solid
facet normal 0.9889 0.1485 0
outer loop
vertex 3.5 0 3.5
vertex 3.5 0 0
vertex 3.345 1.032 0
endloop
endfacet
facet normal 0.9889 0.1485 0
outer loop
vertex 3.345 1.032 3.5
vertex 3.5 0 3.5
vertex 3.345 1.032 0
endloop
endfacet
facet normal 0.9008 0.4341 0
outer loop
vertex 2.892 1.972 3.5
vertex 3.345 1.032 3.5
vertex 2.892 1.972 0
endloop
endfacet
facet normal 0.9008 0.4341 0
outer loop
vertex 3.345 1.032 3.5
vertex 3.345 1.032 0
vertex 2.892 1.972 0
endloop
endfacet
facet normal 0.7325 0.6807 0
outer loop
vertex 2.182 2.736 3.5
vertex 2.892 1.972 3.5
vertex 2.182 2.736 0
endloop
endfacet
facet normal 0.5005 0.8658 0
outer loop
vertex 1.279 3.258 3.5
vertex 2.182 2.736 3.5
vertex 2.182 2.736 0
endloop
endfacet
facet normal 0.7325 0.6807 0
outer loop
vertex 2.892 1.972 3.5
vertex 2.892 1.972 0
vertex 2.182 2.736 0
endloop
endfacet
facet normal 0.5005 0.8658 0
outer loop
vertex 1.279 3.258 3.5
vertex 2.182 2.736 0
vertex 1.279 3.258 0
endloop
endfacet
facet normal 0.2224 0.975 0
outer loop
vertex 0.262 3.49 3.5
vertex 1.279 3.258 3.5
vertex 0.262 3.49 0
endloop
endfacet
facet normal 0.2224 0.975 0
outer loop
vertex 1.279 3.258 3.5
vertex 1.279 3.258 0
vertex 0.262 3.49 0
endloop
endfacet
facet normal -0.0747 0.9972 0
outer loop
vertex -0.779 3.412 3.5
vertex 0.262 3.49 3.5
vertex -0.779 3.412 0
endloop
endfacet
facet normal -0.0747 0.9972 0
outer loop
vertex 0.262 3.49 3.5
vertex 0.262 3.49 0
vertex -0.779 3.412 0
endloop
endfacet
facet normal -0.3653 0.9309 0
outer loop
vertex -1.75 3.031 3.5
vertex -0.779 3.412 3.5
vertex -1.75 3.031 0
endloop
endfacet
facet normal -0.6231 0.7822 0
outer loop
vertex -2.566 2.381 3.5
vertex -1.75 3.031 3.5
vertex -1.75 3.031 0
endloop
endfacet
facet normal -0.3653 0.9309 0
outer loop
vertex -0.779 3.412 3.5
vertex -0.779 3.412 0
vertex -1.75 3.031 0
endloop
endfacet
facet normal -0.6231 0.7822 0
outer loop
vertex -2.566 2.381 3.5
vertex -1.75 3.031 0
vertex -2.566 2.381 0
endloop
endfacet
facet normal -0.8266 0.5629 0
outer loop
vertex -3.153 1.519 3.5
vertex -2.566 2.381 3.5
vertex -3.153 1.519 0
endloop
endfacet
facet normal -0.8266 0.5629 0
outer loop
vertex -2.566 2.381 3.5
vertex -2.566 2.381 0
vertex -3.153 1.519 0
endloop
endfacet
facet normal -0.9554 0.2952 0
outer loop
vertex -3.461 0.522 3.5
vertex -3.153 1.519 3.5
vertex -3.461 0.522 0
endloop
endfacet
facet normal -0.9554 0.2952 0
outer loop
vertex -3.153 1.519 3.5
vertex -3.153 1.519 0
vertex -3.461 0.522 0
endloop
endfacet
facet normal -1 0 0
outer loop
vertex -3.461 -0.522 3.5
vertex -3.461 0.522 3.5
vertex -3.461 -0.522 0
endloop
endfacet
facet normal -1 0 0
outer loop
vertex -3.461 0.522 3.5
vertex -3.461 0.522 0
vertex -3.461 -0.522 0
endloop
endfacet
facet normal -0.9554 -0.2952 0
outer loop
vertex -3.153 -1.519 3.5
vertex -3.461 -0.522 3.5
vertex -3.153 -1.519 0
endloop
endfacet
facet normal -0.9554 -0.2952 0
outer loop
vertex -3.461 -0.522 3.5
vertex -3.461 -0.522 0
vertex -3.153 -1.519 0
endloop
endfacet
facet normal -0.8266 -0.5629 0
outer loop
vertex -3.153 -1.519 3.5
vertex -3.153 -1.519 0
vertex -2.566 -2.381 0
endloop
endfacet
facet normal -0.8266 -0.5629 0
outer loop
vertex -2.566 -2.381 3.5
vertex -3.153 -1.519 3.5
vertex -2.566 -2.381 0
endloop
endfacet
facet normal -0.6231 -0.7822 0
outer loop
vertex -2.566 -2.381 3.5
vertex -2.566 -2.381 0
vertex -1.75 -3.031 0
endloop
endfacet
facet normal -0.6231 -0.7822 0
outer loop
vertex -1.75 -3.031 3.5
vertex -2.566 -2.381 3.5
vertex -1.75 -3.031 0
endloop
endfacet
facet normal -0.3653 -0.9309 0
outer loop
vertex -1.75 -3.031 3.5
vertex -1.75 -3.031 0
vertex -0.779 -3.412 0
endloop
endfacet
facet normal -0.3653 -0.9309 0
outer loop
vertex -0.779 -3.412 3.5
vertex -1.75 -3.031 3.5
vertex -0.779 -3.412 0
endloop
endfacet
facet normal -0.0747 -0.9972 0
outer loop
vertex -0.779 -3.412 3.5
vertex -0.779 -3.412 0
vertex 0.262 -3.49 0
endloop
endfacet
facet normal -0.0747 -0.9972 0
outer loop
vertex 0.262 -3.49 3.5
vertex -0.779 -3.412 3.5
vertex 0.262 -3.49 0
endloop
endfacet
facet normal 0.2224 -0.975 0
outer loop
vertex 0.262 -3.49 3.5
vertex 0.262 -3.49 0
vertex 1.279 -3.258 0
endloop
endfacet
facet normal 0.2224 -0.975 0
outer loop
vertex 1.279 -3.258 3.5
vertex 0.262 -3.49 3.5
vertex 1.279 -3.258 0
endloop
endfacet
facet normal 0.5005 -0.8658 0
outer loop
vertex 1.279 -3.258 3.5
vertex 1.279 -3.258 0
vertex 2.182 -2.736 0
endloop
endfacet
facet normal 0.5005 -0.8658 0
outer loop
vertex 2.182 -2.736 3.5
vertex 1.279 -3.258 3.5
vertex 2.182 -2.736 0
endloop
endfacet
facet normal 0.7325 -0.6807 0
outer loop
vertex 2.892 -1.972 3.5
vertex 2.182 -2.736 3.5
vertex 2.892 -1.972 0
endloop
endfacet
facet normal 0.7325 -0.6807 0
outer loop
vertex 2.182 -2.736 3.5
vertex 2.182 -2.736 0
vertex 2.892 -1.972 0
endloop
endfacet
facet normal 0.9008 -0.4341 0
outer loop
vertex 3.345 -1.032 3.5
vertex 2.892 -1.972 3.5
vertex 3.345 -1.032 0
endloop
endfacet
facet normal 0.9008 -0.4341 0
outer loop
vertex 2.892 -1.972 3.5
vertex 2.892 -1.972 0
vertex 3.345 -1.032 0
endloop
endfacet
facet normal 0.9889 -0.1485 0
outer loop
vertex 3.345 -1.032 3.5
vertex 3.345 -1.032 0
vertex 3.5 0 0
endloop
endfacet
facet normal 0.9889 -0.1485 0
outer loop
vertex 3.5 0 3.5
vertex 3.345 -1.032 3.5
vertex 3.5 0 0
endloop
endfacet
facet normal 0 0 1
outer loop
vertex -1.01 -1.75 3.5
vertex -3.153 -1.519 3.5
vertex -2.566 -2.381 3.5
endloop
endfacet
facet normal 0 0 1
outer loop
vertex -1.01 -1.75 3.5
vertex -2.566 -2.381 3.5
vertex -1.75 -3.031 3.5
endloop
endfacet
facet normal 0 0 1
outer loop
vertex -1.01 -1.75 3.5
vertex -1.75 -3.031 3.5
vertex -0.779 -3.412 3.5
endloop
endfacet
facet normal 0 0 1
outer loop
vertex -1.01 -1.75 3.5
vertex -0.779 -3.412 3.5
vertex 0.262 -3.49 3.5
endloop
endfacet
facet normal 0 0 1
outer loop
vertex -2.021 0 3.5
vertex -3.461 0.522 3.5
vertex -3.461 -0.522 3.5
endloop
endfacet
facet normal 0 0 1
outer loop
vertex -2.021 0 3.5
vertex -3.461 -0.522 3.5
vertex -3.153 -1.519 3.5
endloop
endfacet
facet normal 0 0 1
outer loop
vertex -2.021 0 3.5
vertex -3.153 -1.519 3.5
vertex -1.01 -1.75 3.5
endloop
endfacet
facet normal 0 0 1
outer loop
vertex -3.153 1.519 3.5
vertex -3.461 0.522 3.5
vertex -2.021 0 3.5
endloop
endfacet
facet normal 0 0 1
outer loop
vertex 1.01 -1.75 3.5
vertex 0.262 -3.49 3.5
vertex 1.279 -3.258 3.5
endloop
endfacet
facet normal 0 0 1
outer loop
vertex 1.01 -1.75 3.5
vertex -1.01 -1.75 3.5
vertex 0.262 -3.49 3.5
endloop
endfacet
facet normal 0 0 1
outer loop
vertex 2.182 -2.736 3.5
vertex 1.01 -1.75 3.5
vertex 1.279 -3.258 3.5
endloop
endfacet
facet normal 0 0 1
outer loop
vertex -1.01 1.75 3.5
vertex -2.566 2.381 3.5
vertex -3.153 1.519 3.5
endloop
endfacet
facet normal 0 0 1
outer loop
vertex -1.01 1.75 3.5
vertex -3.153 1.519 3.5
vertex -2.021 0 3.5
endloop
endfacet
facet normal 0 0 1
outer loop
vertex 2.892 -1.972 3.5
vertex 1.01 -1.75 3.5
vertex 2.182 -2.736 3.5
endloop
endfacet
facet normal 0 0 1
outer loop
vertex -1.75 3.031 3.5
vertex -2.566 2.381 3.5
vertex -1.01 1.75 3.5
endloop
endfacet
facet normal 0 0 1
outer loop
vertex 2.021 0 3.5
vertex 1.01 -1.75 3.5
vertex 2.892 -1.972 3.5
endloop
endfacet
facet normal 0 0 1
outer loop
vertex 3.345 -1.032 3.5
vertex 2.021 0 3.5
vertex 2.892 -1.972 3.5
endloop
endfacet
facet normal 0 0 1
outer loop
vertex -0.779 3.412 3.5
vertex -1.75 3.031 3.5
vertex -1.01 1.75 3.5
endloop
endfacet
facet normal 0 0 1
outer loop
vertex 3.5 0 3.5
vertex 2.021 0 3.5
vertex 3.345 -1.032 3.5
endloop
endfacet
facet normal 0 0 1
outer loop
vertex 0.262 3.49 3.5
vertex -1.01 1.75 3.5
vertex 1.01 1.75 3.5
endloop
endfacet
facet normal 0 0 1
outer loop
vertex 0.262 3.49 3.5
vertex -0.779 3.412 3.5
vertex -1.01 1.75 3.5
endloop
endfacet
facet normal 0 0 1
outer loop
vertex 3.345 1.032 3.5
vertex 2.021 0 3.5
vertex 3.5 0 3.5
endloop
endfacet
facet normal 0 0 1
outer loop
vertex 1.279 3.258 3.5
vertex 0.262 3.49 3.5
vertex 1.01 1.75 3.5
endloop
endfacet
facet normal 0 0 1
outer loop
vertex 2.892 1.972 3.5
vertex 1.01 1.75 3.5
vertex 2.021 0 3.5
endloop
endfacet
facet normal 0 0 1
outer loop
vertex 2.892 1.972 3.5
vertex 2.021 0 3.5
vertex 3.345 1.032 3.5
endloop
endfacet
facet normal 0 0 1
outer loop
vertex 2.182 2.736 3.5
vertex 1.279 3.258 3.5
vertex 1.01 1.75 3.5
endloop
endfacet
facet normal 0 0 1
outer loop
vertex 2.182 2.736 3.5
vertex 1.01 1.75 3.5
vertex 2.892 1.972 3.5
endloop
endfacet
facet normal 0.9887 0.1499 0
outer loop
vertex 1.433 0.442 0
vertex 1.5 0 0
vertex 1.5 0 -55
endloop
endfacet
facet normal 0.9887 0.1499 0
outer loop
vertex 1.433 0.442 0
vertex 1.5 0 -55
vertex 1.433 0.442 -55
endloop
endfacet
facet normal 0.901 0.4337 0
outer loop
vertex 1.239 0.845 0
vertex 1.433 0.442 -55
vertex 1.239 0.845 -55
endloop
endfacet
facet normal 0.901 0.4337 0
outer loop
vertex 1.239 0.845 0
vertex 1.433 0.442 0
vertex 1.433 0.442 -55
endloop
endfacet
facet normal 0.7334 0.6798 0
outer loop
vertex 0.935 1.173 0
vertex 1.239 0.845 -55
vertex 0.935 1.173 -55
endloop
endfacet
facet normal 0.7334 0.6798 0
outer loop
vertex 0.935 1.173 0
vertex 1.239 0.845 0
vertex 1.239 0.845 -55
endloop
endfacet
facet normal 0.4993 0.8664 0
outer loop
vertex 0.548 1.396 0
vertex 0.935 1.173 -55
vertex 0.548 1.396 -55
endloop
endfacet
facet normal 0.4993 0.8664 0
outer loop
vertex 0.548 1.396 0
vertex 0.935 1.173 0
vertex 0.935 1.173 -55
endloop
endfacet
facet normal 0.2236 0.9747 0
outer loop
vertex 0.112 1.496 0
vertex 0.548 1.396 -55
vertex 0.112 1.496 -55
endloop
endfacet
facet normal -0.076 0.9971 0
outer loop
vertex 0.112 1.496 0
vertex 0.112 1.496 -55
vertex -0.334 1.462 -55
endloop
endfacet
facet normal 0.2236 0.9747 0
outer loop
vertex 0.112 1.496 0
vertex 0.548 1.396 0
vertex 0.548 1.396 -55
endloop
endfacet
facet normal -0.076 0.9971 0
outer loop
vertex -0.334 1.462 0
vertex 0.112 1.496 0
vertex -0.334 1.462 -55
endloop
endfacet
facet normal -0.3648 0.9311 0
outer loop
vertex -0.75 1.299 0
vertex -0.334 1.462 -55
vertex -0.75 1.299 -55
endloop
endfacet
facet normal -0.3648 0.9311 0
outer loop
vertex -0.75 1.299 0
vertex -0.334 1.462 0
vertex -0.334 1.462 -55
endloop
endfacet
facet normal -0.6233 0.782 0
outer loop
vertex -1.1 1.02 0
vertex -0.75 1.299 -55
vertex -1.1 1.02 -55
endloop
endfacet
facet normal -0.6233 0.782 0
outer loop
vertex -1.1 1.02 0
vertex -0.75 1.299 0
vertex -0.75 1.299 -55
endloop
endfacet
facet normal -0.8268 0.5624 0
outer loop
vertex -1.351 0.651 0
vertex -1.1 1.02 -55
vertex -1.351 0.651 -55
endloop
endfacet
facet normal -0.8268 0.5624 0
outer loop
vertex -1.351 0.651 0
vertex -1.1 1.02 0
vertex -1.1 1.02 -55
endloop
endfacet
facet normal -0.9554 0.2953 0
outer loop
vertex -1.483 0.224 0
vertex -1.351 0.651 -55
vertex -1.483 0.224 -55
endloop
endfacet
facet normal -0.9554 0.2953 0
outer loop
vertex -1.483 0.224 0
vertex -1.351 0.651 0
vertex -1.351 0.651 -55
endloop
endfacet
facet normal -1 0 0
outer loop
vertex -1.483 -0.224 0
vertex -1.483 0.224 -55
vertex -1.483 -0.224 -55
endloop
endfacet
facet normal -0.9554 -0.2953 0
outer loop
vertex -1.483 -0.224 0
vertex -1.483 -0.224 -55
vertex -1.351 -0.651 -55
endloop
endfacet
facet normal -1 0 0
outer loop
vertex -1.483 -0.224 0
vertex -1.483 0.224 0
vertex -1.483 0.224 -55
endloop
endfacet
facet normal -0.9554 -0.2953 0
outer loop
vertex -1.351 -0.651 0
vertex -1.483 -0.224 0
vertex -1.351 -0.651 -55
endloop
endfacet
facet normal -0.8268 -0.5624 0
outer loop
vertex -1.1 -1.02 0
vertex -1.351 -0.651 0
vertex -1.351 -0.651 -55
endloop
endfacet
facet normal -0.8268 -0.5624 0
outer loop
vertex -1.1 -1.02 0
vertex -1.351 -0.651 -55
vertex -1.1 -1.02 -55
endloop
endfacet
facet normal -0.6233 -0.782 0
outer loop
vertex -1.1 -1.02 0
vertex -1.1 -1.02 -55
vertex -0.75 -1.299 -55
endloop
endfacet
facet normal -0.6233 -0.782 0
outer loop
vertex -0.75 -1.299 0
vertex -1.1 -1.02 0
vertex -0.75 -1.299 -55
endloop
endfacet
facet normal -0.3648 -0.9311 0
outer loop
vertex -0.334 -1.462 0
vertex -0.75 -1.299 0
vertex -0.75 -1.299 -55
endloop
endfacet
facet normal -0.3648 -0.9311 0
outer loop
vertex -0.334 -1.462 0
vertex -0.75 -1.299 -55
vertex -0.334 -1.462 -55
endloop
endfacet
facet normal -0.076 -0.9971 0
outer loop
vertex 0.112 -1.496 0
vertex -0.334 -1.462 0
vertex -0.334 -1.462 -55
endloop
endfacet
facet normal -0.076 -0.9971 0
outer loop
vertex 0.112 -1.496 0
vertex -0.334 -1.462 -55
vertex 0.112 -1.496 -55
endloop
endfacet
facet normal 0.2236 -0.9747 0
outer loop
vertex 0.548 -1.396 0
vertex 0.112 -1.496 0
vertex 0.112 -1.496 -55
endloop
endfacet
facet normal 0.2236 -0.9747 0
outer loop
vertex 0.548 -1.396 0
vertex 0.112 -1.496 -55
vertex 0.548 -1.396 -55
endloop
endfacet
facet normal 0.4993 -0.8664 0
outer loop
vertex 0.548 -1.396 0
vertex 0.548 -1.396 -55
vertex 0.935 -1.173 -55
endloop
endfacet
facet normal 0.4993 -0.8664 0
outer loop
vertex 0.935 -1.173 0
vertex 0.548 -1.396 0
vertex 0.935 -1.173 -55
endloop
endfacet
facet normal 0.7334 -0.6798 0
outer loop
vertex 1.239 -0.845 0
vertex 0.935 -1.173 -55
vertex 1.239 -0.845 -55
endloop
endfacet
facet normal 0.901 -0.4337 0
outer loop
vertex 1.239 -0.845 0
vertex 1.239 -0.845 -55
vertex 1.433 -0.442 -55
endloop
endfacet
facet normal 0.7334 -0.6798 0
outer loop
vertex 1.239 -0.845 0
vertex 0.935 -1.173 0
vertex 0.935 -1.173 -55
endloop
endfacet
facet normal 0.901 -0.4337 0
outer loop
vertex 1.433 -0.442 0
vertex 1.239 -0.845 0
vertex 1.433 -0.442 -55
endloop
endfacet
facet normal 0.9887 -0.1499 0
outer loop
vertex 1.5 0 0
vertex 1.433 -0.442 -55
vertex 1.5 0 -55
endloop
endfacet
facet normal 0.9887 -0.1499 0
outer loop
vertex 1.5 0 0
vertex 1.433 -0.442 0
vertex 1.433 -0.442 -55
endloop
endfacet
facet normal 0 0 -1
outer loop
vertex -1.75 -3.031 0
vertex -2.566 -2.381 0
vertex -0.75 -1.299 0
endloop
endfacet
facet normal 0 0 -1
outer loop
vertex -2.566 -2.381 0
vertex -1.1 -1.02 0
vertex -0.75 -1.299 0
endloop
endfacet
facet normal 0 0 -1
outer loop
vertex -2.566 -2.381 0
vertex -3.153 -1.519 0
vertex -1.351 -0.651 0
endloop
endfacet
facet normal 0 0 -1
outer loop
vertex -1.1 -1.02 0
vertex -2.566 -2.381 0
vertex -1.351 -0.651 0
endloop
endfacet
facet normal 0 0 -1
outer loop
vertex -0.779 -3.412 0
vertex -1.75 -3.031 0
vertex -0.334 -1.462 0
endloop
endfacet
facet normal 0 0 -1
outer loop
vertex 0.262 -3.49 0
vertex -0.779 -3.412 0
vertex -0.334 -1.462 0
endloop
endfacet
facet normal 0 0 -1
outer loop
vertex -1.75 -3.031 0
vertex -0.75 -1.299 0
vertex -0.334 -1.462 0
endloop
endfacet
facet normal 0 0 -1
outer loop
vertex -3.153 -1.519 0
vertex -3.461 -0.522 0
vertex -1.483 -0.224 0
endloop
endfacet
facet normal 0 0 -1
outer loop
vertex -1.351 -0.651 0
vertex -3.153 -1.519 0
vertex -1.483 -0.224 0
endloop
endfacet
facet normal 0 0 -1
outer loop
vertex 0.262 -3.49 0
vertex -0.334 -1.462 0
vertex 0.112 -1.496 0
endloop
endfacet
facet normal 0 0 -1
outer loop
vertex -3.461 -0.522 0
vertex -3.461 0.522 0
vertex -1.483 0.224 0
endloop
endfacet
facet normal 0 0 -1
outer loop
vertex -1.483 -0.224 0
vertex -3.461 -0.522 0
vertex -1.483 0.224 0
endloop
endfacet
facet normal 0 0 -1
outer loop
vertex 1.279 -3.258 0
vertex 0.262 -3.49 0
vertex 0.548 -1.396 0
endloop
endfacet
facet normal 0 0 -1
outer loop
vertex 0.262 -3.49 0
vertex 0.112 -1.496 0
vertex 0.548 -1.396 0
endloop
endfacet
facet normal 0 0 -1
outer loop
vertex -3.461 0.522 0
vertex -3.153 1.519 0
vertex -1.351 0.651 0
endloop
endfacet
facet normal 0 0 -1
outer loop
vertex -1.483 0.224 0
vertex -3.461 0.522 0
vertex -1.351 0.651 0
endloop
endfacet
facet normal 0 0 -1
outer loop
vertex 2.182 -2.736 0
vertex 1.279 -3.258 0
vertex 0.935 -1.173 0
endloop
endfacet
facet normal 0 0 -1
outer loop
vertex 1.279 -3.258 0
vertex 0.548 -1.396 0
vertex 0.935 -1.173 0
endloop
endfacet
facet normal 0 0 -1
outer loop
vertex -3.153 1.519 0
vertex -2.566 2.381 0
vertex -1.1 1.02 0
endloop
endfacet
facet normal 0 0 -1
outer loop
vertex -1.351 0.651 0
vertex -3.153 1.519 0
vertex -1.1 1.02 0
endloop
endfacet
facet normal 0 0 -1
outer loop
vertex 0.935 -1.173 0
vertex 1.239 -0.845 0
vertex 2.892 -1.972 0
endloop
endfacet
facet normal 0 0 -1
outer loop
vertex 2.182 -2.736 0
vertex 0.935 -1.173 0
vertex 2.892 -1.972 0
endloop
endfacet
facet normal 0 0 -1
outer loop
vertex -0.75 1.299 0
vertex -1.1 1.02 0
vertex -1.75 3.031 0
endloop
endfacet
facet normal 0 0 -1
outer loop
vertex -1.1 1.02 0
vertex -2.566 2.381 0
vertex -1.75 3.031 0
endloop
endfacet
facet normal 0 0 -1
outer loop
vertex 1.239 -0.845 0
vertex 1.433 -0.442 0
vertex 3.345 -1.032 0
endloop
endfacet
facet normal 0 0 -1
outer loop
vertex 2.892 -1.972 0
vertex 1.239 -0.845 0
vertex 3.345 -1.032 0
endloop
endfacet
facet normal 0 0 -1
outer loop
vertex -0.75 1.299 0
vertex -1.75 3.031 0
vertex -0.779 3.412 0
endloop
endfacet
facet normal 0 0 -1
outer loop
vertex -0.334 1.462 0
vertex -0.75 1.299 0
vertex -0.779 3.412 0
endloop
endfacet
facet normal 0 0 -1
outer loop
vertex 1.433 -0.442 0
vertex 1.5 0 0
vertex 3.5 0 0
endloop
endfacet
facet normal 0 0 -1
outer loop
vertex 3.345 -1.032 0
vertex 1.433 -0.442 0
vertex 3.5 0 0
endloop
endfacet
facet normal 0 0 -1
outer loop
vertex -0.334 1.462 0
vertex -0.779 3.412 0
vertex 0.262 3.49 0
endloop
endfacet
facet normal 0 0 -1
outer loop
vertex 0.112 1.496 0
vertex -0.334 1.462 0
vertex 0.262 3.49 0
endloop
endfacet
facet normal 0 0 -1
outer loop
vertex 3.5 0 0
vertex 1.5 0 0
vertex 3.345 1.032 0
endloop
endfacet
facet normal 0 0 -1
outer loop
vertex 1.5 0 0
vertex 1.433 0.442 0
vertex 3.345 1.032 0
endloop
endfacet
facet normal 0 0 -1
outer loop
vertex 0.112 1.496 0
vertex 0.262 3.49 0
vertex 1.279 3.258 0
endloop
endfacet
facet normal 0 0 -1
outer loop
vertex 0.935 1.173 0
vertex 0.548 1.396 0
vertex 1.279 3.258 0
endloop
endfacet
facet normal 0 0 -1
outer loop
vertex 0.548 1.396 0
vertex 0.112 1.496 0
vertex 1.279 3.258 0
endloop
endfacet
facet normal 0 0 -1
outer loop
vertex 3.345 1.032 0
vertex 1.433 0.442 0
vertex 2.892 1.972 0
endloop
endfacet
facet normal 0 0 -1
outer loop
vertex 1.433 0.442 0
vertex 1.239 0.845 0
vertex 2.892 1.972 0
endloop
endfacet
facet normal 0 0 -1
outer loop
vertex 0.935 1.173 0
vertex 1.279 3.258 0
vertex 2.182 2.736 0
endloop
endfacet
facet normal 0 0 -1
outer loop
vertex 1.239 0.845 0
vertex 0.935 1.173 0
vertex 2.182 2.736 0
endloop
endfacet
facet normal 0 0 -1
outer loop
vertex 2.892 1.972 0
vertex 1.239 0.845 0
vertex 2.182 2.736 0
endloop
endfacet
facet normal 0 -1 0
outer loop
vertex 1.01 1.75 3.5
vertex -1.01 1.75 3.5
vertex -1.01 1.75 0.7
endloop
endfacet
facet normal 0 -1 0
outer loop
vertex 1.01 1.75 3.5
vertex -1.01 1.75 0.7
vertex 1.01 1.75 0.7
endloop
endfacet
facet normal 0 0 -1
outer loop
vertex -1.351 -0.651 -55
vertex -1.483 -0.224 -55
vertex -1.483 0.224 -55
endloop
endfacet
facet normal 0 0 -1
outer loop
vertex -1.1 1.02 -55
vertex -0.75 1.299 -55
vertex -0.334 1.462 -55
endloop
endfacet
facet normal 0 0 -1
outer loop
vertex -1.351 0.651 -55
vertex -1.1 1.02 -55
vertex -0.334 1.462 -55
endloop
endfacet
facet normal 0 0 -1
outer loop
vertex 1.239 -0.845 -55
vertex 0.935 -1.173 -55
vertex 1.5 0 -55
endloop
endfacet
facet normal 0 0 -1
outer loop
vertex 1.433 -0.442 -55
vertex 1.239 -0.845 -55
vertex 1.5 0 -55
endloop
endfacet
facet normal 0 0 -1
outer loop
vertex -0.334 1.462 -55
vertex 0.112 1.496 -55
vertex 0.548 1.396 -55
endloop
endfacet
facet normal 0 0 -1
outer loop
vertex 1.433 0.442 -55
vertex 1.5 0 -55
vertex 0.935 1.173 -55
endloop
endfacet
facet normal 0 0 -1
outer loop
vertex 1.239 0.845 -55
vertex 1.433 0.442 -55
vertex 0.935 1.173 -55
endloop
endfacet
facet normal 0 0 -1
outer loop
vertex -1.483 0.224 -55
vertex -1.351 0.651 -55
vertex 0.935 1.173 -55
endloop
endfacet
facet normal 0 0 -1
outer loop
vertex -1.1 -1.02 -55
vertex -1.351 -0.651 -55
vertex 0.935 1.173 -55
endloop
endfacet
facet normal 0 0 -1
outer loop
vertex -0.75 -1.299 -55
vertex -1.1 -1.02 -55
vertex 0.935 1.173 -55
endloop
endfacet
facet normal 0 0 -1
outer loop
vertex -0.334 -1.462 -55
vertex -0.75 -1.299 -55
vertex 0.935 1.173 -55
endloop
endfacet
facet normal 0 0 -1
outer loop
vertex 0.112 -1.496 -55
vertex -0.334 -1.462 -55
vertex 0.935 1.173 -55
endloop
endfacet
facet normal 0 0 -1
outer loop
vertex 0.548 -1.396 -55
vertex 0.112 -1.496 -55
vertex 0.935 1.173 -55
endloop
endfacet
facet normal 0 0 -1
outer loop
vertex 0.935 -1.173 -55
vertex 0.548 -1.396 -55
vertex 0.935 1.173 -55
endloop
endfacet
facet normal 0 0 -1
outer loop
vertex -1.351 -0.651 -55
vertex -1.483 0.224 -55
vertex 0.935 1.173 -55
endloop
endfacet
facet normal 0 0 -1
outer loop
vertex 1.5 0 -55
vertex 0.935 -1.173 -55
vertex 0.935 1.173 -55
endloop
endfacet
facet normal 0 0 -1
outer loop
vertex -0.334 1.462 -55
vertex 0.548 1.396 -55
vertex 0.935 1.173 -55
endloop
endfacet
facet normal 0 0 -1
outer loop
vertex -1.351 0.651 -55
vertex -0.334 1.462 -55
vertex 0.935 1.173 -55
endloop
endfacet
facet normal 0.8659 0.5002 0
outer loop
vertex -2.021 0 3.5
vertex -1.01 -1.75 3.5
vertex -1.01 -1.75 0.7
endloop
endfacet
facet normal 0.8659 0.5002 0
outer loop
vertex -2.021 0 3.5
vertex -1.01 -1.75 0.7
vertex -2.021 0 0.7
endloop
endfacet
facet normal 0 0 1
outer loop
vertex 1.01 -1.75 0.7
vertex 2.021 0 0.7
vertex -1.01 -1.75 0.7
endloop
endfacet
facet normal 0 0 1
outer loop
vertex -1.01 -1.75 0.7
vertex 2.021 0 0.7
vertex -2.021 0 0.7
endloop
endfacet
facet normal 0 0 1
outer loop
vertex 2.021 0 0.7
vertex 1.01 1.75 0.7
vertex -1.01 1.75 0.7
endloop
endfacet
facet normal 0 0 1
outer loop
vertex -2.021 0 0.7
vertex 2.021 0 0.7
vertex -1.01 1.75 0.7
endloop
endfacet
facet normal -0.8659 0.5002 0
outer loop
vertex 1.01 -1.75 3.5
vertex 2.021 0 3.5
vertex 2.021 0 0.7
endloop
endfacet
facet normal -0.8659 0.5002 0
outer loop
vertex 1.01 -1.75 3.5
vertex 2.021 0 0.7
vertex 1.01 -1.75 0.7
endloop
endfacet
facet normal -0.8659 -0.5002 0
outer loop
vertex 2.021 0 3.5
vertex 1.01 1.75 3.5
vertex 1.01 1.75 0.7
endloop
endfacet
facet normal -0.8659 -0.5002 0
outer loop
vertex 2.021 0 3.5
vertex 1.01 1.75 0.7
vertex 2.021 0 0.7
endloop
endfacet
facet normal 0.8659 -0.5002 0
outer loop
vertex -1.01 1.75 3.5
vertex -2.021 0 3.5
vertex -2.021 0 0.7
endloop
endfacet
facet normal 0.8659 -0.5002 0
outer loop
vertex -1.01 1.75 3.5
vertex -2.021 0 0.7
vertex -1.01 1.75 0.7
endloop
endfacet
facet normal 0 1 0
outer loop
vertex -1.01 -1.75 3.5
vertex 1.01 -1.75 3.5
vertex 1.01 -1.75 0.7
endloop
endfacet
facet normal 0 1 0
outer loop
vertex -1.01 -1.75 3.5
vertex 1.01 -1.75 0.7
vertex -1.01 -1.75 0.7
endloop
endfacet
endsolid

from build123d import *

# Parameters (mm, degrees)
HEAD_BOSS_EXTRUDE1_OUTLINE_R = 3.5
HEAD_BOSS_EXTRUDE1_DEPTH     = 3.5
HEAD_HEX_CUT_EXTRUDE1_DEPTH  = 2.8
SKETCH2_R                    = 1.5
SCREW_BOSS_EXTRUDE2_DEPTH    = 55


# Read off the part's stored shape, not the designer's step: Head Boss-Extrude1
with BuildPart() as part:
    # Head Boss-Extrude1 outline → Head Boss-Extrude1 (new body)
    with BuildSketch(Plane.XY):
        Circle(HEAD_BOSS_EXTRUDE1_OUTLINE_R)
    extrude(amount=HEAD_BOSS_EXTRUDE1_DEPTH)

    # Sketch3 → Head Hex Cut-Extrude1 (cut)
    with BuildSketch(Plane.XY.offset(3.5)):
        Polygon((-1.010362971, 1.75), (1.010362971, 1.75), (2.020725942, 0), (1.010362971, -1.75), (-1.010362971, -1.75), (-2.020725942, 0), align=None)
    extrude(amount=-HEAD_HEX_CUT_EXTRUDE1_DEPTH, mode=Mode.SUBTRACT)

    # Sketch2 → Screw Boss-Extrude2 (add)
    with BuildSketch(Plane.XY):
        Circle(SKETCH2_R)
    extrude(amount=-SCREW_BOSS_EXTRUDE2_DEPTH)


solid = part.part
